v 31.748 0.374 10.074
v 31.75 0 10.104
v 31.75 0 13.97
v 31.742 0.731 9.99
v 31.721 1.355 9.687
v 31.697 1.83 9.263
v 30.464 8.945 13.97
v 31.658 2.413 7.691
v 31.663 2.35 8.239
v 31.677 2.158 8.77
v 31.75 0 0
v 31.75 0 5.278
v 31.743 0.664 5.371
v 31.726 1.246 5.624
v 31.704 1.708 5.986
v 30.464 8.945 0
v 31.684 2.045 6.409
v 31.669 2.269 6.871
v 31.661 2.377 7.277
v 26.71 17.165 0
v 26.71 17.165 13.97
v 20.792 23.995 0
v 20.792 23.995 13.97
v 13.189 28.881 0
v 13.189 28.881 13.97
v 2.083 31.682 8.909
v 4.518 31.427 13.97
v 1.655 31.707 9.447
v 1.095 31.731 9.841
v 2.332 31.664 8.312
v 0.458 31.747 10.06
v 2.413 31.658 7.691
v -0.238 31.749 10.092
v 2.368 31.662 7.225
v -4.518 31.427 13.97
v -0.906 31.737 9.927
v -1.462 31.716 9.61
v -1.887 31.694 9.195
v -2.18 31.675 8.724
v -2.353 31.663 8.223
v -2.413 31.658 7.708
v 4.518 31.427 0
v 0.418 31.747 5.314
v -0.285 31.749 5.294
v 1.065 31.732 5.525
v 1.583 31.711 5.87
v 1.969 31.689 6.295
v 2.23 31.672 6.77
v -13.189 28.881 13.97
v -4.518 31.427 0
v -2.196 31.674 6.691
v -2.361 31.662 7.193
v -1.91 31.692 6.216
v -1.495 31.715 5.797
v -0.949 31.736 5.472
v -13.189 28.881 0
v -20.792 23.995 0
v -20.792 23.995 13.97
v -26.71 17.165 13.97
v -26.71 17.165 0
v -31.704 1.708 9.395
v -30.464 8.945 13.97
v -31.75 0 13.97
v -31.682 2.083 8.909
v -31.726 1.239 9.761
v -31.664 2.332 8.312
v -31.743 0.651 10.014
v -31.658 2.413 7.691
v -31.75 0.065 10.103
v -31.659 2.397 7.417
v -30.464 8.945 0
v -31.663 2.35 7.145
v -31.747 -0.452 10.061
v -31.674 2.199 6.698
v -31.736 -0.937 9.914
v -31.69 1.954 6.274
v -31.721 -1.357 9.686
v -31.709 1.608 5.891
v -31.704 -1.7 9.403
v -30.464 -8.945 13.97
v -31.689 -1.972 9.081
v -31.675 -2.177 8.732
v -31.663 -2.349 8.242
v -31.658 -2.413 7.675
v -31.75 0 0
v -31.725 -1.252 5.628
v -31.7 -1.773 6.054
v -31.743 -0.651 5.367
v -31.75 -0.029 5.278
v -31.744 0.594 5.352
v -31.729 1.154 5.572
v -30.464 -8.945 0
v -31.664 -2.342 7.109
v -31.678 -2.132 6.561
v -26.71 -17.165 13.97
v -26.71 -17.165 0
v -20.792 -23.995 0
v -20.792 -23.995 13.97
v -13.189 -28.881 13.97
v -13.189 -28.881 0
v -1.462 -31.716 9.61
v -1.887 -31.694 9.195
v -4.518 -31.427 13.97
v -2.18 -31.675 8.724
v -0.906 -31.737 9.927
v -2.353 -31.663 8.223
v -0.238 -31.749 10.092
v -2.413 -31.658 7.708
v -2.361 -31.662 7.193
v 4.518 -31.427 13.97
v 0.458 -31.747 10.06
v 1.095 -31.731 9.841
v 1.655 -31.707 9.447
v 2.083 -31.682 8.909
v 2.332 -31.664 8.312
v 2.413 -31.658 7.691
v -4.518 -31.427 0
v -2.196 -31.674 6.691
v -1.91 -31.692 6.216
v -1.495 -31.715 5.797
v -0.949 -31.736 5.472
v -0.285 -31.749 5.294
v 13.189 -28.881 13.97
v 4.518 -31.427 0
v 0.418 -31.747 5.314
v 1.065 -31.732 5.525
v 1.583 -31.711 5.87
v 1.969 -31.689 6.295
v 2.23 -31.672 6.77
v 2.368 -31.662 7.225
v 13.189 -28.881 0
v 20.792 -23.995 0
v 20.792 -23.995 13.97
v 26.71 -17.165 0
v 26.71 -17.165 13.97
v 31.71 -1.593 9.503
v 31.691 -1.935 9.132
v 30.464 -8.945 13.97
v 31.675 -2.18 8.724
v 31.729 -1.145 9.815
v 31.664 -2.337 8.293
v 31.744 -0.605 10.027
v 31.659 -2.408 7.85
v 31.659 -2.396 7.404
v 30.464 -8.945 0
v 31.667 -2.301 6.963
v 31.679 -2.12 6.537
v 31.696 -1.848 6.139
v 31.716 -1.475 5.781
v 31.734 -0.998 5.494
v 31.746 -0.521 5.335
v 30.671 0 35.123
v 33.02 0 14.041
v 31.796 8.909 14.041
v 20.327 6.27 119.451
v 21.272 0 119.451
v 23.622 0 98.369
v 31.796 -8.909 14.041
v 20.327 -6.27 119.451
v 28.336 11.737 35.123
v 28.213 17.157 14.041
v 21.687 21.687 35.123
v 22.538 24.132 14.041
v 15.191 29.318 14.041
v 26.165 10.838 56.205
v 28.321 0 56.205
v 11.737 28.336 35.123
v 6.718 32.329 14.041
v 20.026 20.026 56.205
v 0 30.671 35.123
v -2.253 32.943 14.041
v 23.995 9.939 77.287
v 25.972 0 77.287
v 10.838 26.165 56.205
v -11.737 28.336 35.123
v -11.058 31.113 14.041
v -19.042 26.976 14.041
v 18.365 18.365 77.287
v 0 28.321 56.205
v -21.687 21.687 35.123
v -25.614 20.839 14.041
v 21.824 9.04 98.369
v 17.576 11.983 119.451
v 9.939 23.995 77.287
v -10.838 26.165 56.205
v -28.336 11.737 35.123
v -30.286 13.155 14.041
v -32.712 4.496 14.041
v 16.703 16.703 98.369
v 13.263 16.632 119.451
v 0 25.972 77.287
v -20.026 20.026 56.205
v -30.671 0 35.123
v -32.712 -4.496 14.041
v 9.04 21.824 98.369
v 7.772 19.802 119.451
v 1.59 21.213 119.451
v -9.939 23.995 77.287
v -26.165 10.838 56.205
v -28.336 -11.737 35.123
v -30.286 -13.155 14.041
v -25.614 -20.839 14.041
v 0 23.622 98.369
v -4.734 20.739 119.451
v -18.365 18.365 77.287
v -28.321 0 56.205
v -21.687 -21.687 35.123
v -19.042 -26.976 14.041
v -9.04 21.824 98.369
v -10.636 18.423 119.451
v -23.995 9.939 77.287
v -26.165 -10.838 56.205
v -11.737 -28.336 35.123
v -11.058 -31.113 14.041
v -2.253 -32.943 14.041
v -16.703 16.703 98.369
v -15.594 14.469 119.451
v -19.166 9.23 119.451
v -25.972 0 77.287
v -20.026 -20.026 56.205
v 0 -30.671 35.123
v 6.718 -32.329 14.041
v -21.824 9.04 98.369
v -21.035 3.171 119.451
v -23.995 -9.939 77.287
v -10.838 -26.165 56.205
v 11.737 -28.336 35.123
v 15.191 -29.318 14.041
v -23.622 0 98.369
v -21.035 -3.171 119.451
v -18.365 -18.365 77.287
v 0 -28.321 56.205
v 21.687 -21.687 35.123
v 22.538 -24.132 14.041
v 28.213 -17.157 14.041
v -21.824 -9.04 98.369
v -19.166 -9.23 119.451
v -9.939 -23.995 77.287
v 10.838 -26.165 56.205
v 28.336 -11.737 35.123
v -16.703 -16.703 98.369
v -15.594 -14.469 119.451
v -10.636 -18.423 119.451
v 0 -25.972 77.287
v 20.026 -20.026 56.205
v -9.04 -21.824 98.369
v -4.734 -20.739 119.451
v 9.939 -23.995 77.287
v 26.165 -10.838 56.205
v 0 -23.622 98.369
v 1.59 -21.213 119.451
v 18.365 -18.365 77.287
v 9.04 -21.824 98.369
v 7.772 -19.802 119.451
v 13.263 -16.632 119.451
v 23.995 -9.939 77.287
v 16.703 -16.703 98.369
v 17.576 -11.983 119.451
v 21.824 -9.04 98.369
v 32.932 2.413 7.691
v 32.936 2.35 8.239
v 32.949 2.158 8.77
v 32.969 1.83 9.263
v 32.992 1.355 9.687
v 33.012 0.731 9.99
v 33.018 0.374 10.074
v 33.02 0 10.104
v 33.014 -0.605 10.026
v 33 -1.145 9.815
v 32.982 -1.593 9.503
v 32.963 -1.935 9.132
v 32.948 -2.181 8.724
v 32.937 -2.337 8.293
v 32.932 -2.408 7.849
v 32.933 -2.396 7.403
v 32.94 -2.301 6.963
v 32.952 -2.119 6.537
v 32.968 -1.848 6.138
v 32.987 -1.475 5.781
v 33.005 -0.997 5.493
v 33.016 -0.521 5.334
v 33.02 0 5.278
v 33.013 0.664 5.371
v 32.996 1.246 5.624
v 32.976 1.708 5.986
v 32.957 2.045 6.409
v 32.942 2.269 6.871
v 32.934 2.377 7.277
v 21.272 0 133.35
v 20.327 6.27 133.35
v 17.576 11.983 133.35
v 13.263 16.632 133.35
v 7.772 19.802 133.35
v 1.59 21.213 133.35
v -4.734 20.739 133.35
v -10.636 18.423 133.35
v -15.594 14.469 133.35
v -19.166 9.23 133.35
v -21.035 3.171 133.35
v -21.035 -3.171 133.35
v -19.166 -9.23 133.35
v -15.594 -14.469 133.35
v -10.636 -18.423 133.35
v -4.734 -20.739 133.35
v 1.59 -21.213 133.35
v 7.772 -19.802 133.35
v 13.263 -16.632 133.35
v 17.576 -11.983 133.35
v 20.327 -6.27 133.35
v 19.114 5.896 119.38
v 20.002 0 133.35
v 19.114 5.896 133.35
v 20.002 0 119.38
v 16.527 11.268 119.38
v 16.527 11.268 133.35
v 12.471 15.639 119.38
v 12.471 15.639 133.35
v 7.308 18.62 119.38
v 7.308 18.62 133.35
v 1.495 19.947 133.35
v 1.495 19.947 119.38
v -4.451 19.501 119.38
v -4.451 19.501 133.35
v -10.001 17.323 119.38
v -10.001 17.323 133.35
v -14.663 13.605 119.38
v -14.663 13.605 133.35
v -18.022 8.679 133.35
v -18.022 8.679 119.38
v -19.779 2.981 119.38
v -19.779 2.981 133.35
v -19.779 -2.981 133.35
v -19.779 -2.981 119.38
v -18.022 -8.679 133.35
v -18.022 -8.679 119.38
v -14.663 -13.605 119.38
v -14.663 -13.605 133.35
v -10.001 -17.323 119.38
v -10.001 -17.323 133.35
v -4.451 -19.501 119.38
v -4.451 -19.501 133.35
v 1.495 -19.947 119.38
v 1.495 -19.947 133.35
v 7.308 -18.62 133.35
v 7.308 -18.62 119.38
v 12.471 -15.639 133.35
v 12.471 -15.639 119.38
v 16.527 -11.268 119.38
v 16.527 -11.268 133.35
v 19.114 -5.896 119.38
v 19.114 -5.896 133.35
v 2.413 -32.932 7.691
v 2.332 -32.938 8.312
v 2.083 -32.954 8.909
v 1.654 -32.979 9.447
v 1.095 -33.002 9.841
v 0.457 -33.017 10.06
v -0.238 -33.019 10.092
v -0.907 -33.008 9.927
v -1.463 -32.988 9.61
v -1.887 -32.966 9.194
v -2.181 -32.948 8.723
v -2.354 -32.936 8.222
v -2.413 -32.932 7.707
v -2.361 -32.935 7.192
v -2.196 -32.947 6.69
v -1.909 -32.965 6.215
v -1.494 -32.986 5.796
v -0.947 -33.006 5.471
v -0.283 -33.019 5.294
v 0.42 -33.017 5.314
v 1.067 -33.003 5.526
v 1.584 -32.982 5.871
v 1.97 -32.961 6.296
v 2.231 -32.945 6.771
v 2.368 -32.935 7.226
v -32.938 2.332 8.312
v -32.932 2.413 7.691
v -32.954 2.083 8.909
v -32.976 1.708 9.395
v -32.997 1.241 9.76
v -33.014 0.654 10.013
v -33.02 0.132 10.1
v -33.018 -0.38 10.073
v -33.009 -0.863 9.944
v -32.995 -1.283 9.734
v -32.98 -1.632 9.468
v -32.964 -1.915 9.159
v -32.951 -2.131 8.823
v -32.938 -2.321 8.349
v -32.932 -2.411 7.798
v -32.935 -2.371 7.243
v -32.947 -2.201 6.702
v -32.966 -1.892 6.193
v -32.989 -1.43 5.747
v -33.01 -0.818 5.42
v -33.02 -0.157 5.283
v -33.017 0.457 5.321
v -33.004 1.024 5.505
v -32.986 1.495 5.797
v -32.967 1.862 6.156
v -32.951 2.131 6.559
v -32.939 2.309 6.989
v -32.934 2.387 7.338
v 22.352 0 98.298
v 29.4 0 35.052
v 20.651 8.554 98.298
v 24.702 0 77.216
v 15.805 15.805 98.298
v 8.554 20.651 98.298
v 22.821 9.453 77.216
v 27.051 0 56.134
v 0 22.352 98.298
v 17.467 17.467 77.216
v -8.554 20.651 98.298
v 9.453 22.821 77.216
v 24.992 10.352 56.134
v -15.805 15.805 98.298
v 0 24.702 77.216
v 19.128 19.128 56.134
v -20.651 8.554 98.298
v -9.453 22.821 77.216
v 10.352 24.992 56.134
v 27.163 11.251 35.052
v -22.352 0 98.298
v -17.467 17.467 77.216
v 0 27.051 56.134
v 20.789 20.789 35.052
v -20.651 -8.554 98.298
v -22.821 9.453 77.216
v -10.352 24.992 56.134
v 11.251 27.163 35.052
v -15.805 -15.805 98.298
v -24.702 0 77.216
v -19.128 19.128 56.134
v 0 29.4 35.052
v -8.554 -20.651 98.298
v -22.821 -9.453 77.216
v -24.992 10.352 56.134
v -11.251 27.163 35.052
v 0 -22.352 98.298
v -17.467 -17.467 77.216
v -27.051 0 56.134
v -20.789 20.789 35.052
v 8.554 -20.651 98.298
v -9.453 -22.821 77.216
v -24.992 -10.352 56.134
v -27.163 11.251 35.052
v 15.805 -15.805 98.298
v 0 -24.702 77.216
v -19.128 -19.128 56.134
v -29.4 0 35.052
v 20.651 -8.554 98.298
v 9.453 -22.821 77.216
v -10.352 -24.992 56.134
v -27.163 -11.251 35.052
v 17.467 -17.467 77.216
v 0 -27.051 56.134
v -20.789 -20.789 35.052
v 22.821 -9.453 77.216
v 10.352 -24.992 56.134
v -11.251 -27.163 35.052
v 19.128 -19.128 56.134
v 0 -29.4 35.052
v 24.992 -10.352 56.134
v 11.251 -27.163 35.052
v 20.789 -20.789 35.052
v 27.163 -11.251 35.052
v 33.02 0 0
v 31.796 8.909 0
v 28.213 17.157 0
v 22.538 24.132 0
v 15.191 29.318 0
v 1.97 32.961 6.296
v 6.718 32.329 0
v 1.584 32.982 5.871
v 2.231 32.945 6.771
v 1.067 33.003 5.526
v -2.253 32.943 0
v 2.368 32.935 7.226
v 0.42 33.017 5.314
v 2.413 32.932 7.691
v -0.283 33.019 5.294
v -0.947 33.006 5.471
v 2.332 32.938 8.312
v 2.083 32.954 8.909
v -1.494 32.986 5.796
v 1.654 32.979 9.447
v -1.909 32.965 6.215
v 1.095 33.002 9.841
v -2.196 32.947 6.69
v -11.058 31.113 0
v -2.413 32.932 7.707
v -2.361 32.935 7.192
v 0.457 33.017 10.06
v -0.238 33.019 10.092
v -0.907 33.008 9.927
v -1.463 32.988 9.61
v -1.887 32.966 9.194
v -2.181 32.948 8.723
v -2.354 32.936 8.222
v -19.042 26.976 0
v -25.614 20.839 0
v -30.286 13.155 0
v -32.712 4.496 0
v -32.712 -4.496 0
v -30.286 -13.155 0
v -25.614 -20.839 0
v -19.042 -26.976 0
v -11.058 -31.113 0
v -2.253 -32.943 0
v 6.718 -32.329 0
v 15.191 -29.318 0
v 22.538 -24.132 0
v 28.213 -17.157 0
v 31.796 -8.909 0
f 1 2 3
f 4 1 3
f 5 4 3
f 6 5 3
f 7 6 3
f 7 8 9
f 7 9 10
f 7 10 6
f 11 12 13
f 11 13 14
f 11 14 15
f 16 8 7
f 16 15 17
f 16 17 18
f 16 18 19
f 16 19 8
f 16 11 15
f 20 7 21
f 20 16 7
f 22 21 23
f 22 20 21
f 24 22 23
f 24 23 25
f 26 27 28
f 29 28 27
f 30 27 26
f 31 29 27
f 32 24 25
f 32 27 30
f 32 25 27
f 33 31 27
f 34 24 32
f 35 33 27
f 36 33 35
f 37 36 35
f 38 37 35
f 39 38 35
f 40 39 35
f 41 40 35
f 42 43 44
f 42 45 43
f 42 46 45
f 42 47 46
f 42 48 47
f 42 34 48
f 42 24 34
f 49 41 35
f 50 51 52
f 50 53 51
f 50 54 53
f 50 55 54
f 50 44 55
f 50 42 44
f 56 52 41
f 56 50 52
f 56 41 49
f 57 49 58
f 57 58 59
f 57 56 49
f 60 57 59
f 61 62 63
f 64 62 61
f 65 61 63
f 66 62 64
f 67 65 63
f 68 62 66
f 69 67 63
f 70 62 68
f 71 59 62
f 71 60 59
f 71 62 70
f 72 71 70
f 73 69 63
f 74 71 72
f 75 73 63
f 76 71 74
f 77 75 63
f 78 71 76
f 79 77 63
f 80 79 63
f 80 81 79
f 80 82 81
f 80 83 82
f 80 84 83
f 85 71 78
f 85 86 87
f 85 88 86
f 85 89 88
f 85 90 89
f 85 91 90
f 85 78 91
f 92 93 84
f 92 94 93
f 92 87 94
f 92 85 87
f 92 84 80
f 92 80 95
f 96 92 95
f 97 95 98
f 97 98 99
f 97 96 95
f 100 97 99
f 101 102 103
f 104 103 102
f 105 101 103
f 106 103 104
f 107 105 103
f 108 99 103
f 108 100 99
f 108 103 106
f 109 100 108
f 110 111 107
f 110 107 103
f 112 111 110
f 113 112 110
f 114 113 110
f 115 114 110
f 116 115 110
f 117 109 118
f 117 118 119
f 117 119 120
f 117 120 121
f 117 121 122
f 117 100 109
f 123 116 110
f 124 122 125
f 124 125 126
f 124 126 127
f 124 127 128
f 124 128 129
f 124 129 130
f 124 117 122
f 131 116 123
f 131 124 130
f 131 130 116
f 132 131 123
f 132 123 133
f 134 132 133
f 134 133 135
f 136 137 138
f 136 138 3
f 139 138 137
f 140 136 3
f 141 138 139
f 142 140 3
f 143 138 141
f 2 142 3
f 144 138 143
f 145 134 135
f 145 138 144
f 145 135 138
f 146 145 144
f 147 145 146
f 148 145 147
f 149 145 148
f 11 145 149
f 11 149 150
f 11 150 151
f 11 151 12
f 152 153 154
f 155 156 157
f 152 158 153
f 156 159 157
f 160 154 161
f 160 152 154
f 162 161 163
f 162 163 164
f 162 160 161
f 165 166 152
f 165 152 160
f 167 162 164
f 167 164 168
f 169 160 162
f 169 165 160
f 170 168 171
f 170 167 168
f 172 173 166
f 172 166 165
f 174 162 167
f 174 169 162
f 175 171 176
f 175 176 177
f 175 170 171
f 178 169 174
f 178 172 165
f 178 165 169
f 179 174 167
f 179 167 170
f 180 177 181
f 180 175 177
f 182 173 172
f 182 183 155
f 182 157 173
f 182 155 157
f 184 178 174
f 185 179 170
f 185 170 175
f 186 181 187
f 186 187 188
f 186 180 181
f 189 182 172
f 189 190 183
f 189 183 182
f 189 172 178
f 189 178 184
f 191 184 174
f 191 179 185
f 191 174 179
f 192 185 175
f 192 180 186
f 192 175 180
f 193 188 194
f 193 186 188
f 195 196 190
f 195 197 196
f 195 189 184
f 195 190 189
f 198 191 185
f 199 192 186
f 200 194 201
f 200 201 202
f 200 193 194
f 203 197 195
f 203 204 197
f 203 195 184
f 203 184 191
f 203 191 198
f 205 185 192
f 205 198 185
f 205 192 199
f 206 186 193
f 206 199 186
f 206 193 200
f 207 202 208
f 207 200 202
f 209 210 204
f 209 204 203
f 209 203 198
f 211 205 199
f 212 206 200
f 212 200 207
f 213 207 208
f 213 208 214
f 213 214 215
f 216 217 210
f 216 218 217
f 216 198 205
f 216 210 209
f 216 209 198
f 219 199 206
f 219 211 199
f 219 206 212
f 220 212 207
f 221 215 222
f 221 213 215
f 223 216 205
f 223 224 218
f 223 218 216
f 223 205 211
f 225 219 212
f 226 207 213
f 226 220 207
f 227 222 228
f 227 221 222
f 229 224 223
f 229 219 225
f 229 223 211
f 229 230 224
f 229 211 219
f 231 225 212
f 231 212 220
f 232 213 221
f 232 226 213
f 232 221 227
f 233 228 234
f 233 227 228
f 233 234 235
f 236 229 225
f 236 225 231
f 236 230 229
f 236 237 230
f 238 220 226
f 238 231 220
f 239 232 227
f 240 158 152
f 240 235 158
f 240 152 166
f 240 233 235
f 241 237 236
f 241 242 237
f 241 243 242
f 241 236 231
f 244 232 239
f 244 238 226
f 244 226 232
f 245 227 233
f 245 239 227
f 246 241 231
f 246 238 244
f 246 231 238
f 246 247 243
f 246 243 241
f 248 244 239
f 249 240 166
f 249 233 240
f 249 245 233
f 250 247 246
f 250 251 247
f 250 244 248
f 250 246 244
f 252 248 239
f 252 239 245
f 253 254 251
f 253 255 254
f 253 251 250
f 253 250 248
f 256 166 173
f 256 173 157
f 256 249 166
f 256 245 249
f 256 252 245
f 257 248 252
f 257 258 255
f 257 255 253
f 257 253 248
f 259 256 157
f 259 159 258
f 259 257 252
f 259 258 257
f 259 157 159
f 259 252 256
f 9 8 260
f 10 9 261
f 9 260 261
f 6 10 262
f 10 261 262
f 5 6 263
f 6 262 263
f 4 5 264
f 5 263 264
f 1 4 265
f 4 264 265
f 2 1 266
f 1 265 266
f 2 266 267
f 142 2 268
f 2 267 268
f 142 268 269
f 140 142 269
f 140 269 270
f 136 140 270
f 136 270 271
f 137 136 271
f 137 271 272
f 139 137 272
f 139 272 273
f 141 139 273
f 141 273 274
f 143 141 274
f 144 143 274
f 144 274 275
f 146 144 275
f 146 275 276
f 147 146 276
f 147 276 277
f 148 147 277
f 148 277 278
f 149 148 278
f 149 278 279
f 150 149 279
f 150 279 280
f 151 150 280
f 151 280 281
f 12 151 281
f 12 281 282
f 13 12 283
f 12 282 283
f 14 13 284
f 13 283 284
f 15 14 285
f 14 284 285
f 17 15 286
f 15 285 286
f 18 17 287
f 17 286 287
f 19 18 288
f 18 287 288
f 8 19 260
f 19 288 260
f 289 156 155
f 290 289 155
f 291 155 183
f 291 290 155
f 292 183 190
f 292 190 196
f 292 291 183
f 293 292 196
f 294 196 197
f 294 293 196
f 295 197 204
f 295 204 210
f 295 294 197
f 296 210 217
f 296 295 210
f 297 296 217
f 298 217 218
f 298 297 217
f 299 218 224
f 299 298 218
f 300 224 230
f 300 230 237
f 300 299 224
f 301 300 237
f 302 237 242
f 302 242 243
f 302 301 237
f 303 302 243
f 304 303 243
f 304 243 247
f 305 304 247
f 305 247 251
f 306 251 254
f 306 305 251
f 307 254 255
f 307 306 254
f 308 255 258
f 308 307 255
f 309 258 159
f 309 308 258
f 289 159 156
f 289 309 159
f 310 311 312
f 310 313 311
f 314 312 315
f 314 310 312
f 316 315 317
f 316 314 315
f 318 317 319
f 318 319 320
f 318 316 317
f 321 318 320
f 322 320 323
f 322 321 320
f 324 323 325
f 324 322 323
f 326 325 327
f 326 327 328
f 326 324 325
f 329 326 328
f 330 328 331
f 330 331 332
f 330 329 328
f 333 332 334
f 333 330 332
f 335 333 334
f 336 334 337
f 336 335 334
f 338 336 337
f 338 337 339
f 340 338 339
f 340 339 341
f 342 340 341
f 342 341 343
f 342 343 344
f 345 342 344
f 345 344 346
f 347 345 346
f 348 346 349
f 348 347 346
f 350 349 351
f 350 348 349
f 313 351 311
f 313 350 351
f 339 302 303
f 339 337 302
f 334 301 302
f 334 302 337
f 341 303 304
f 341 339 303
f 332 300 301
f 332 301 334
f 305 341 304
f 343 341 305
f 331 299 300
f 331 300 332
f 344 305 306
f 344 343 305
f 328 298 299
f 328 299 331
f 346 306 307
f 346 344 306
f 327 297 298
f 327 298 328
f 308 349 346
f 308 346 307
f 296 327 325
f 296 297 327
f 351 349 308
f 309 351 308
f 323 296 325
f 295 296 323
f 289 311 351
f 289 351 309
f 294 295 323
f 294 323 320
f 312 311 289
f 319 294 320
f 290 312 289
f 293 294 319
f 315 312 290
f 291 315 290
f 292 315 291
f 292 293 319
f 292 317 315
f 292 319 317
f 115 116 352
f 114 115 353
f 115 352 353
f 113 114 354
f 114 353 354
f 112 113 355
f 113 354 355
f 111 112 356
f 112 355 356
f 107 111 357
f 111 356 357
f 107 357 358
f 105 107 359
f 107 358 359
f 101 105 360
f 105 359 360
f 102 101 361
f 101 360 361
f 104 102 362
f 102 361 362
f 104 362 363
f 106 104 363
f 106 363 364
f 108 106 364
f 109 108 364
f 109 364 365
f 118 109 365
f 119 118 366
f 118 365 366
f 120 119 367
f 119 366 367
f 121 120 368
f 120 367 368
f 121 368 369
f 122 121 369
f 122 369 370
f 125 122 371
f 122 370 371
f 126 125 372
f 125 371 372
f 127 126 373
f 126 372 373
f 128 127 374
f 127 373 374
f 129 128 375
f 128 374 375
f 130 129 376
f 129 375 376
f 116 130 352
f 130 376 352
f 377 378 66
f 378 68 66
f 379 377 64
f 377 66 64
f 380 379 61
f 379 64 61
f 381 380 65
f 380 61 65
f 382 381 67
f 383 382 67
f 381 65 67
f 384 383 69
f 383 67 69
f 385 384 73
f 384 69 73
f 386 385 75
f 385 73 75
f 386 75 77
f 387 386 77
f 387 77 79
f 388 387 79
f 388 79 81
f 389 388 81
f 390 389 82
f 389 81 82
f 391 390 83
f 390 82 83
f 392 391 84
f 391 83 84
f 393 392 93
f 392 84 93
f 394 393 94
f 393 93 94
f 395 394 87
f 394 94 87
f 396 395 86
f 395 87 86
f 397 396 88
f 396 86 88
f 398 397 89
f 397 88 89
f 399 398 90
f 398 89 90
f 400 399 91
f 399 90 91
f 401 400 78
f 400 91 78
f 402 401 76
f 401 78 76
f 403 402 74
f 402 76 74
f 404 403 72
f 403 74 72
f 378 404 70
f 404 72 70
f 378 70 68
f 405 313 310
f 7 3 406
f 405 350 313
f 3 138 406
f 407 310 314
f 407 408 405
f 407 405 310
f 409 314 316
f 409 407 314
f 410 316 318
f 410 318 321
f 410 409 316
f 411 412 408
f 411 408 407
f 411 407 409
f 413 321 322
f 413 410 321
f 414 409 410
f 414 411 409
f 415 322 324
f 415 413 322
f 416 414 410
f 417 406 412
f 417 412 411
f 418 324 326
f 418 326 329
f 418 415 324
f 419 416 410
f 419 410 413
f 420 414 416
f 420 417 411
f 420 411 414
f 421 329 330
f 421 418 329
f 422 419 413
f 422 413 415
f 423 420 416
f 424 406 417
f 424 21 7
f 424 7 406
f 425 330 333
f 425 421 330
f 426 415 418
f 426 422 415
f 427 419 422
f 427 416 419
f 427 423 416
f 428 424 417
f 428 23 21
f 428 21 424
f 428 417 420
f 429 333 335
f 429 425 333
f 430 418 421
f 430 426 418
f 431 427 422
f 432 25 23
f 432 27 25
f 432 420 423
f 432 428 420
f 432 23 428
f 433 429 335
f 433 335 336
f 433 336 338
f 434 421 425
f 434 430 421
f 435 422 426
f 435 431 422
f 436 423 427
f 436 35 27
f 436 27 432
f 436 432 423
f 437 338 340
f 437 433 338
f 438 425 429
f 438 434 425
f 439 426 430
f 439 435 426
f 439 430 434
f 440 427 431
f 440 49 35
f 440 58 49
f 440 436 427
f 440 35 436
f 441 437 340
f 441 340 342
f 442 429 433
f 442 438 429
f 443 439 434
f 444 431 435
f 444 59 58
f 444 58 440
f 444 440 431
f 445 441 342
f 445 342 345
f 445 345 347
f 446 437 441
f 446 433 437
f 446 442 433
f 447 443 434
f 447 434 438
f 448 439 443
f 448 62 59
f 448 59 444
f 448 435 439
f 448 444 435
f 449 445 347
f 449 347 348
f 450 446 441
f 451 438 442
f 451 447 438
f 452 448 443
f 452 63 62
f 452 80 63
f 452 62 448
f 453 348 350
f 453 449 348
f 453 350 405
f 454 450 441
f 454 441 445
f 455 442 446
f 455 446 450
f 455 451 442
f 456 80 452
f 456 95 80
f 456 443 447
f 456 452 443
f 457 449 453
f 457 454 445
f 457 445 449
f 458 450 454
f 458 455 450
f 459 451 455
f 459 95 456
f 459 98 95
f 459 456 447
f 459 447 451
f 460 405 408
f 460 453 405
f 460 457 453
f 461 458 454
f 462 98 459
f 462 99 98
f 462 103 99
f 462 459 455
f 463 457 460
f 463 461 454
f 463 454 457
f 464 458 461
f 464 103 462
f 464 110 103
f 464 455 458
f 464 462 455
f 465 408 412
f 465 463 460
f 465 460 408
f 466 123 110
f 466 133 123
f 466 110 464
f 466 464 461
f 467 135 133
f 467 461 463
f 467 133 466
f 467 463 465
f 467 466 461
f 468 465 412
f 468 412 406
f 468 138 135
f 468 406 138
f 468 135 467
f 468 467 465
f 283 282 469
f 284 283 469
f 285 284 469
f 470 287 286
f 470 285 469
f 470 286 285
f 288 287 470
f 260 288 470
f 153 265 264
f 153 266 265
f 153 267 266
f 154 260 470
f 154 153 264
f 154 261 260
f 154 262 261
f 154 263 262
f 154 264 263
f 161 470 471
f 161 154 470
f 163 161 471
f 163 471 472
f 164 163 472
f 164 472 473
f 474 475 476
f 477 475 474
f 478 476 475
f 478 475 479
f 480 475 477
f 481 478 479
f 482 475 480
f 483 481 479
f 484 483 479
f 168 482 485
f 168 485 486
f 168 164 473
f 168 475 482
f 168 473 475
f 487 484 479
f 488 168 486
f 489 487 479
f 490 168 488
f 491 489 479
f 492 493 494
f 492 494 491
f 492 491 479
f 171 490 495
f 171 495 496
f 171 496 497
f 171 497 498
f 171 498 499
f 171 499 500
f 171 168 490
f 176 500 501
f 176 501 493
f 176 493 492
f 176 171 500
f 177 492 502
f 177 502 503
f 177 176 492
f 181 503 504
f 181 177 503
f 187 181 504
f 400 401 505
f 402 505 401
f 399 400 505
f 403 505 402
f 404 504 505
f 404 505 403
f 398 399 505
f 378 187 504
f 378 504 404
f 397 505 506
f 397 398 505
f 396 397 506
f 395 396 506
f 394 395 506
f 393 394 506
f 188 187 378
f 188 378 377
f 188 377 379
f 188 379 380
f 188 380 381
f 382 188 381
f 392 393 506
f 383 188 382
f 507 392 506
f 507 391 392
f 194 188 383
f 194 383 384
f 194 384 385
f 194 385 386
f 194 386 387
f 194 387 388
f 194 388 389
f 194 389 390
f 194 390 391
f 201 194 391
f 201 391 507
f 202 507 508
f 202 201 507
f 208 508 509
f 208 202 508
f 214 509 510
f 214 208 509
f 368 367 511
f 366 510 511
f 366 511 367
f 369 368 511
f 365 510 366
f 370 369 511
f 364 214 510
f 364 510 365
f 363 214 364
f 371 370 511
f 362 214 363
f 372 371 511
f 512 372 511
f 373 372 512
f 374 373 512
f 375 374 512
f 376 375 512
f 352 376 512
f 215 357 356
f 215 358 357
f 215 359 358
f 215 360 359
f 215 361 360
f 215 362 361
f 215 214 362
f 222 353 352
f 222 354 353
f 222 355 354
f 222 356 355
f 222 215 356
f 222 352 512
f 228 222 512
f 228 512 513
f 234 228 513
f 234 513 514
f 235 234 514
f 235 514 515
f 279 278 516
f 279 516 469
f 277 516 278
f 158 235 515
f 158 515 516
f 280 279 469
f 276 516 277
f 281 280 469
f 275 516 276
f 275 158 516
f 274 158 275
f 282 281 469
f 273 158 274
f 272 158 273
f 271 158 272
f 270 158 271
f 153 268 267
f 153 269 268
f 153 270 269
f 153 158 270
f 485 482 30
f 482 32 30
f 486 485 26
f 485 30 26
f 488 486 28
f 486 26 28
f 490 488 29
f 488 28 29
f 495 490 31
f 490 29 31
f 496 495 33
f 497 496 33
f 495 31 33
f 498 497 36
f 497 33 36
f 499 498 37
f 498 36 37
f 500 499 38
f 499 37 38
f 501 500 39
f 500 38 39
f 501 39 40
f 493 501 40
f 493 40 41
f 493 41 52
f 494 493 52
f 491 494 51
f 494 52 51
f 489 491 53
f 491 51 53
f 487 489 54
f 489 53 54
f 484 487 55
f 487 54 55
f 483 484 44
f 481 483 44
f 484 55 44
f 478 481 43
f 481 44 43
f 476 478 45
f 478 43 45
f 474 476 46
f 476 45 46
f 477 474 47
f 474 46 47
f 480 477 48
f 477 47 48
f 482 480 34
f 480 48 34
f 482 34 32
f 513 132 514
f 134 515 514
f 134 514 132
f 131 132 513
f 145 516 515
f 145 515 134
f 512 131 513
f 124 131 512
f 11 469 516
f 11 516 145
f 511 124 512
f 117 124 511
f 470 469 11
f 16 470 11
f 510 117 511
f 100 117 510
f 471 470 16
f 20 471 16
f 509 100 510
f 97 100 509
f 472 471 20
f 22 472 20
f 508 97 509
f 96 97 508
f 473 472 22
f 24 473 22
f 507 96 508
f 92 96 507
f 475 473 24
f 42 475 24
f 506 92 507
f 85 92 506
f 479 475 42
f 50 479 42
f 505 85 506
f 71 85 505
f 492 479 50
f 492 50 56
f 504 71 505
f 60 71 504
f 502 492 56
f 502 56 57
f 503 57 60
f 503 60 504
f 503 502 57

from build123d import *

# Parameters (mm, degrees)
F2_R     = 2.413
F4_DEPTH = 50.8
F3_R     = 2.413
F5_DEPTH = 50.8


with BuildPart() as f1:
    # F0 (on Front) → F1 (revolve)
    with BuildSketch(Plane.XZ):
        Polygon((31.75, 13.97), (31.75, 0), (33.02, 0), (33.02, 14.04055), (21.2725, 119.45055), (21.2725, 133.35), (20.0025, 133.35), (20.0025, 119.38), align=None)
    revolve(axis=Axis((0, 0, 24.955008), (0, 0, 1)))

    # F2 (on Front) → F4 (cut, symmetric)
    with BuildSketch(Plane.XZ):
        with Locations((0, 7.69055)):
            Circle(F2_R)
    extrude(amount=F4_DEPTH, both=True, mode=Mode.SUBTRACT)

    # F3 (on Right) → F5 (cut, symmetric)
    with BuildSketch(Plane.YZ):
        with Locations((0, 7.69055)):
            Circle(F3_R)
    extrude(amount=F5_DEPTH, both=True, mode=Mode.SUBTRACT)


solid = f1.part
